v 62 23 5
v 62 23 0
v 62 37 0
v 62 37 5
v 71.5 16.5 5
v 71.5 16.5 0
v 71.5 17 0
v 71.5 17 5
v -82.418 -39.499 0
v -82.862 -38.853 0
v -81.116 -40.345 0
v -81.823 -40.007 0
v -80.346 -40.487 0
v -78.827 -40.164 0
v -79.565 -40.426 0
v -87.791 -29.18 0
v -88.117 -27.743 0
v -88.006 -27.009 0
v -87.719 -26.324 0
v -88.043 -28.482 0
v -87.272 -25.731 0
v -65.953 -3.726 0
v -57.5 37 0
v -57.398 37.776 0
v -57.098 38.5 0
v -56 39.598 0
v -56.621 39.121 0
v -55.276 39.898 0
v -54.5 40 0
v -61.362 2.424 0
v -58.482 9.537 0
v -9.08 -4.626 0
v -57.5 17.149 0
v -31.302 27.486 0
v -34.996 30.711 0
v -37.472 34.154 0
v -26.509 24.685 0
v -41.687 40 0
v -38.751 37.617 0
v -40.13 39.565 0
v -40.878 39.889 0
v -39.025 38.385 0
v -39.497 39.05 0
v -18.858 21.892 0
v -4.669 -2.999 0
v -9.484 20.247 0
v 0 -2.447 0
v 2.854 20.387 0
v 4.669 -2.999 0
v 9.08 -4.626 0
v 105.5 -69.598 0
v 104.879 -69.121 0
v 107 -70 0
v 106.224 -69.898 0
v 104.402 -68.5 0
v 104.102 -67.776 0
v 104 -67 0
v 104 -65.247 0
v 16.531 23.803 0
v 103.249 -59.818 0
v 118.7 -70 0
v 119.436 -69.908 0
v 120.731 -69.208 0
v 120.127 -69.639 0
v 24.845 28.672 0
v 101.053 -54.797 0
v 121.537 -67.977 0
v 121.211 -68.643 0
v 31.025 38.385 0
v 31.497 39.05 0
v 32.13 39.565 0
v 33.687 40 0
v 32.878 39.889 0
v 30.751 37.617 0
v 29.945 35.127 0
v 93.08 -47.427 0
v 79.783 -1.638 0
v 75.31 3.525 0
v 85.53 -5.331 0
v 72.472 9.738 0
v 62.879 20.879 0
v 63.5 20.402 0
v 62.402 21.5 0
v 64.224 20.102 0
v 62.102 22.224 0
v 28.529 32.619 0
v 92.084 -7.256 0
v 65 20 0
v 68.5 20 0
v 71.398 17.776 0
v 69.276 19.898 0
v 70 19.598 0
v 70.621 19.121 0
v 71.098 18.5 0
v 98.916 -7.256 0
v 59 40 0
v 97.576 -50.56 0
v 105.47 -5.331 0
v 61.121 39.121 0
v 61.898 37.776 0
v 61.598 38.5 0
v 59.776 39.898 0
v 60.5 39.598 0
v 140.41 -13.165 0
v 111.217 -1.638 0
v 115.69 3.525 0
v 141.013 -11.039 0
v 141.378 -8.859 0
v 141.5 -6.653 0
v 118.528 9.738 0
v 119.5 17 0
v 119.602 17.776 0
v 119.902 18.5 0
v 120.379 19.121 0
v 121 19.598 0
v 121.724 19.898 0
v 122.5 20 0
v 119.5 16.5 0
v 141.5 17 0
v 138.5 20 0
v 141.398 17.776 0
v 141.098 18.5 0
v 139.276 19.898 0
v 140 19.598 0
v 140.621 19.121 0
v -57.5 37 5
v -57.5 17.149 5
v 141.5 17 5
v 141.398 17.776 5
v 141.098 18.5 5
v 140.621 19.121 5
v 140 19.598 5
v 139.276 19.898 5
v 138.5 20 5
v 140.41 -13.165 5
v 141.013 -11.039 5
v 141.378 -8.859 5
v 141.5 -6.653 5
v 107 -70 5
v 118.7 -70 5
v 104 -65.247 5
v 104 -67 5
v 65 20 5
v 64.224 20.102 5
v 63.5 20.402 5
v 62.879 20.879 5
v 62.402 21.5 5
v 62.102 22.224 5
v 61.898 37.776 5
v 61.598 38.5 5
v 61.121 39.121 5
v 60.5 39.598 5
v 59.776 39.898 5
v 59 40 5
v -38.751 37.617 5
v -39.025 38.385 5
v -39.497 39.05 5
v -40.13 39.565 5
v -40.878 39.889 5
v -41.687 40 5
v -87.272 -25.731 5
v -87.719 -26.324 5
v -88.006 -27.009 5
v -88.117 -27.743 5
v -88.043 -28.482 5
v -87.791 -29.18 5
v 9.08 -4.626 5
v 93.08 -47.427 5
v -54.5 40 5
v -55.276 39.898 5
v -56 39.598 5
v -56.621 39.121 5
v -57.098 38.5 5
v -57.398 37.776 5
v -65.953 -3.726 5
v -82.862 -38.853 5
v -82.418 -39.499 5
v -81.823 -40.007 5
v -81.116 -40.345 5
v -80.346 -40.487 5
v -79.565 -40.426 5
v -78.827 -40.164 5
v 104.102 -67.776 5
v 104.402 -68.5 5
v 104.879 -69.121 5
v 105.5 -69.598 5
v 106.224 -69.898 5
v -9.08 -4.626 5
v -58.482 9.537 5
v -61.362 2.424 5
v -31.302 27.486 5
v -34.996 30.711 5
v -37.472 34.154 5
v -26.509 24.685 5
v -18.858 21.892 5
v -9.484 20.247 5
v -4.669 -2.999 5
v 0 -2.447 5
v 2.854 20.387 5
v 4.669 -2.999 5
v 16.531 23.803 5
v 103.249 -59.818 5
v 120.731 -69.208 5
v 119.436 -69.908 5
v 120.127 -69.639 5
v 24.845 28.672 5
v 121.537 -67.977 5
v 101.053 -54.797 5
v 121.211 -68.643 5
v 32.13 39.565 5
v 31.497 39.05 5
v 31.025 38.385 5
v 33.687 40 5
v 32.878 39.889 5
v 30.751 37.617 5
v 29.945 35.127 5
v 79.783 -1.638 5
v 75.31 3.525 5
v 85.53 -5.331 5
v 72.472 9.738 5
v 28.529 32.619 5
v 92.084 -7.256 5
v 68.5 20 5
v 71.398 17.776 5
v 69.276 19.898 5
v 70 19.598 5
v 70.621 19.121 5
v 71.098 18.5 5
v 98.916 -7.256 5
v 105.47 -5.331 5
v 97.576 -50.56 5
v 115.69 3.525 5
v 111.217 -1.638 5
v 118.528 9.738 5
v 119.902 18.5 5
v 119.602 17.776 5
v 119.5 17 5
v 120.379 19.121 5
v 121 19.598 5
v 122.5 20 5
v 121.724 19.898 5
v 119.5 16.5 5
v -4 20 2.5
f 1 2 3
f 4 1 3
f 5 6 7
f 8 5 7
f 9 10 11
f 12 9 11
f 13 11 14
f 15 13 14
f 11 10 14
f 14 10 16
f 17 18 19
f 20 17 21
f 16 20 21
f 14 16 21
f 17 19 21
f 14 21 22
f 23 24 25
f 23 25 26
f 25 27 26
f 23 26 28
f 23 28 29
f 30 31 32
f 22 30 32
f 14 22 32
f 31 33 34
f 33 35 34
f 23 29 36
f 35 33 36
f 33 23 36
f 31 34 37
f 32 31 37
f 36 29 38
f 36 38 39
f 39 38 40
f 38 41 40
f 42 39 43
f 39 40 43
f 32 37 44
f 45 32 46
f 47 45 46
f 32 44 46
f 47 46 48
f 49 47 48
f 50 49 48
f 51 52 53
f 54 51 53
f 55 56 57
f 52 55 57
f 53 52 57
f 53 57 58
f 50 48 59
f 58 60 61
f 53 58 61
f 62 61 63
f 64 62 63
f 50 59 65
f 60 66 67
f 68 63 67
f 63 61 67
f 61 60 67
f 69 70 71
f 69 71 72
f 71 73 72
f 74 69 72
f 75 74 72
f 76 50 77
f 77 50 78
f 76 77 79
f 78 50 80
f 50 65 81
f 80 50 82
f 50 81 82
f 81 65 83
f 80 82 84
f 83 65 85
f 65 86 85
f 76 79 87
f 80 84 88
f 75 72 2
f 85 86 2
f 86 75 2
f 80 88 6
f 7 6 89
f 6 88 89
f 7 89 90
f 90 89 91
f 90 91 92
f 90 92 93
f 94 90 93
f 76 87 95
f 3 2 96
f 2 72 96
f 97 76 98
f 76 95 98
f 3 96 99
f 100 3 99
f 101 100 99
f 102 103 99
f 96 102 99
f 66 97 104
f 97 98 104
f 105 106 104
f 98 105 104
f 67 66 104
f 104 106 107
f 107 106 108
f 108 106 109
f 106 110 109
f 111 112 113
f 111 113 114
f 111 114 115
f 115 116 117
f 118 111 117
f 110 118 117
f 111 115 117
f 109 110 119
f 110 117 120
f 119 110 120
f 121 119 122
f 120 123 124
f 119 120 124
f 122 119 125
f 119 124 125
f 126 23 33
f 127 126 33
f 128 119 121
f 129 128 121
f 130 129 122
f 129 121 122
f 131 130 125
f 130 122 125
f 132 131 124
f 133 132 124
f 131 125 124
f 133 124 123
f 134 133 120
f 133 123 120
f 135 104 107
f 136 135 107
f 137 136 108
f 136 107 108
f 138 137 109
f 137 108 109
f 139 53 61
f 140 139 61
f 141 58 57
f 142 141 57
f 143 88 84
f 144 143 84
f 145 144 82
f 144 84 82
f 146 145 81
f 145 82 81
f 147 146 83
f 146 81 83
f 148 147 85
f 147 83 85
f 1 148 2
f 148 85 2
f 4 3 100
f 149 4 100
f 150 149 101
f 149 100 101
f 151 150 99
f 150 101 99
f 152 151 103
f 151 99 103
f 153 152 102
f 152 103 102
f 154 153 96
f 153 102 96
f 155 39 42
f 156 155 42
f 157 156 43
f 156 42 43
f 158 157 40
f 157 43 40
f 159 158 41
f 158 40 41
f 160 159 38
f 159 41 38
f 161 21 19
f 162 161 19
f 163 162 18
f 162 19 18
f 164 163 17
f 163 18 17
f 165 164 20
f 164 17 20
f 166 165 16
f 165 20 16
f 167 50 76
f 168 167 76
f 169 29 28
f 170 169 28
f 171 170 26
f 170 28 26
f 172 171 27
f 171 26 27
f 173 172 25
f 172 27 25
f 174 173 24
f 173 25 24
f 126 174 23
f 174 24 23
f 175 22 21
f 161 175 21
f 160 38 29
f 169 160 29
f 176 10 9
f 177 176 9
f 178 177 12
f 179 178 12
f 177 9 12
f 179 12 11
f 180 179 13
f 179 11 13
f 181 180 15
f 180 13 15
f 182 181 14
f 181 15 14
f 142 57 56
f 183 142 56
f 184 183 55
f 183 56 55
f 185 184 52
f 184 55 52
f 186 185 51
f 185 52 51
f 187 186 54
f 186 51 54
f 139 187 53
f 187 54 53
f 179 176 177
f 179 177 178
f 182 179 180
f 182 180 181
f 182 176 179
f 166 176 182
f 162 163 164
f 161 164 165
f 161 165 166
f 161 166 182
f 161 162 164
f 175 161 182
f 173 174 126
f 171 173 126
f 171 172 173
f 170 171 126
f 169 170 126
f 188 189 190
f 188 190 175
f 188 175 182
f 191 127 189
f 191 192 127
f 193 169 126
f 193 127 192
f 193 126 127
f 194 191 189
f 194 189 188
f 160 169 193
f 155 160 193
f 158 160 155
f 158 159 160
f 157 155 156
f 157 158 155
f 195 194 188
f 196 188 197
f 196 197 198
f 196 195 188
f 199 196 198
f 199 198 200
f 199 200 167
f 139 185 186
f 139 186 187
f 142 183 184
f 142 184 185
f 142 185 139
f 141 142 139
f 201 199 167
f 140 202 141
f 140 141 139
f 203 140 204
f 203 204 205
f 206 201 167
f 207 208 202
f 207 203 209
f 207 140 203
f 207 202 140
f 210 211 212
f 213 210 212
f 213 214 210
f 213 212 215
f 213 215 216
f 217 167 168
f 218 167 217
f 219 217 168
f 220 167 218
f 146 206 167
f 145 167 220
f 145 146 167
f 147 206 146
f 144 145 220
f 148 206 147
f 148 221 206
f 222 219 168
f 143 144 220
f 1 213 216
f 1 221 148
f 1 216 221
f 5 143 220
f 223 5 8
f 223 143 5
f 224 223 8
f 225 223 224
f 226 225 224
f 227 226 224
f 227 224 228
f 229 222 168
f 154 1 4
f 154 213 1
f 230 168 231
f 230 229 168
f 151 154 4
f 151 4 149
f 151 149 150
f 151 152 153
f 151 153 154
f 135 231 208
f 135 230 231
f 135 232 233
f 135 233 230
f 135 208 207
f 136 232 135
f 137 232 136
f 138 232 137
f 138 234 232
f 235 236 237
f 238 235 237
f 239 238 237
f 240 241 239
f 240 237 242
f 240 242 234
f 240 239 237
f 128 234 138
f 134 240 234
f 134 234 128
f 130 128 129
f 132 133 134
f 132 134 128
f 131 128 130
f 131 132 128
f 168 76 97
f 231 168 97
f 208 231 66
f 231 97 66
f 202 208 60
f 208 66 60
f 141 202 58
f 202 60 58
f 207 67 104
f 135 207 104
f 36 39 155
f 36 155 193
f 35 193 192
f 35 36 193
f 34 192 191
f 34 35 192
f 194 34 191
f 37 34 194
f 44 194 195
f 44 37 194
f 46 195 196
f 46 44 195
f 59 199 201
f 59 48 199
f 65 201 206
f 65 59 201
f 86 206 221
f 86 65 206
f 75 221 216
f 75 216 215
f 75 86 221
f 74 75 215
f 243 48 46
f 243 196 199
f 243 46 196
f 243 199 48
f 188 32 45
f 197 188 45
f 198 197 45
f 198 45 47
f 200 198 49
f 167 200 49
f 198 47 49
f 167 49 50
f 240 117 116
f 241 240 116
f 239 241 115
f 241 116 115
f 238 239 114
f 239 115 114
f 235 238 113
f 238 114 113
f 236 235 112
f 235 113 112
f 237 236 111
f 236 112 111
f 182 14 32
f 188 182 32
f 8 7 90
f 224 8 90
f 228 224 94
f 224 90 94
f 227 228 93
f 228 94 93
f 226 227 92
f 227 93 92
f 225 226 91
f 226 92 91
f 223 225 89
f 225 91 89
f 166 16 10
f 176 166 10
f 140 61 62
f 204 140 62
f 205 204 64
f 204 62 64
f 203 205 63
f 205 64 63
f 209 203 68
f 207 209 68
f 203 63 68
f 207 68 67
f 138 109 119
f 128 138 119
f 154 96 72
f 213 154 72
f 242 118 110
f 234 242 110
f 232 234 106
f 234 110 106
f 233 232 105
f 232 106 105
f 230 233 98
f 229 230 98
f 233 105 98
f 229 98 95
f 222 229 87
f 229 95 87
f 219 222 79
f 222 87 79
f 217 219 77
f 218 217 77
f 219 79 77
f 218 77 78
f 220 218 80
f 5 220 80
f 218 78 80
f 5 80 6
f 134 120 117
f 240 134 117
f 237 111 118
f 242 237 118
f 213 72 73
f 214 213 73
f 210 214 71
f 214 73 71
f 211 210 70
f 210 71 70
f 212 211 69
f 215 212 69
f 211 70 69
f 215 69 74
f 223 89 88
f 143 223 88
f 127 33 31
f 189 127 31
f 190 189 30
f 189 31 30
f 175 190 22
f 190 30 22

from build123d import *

# Parameters (mm, degrees)
EXTRUDE1_DEPTH = 5


with BuildPart() as part:
    # Sketch1 → Extrude1 (new body)
    with BuildSketch(Plane.XY):
        with BuildLine():
            Line((9.079809995, -4.626394269), (93.079809995, -47.426532026))
            ThreePointArc((93.079809995, -47.426532026), (101.052803287, -54.796691216), (104, -65.24666251))
            Line((104, -65.24666251), (104, -67))
            ThreePointArc((104, -67), (104.878679656, -69.121320344), (107, -70))
            Line((107, -70), (118.700463999, -70))
            ThreePointArc((118.700463999, -70), (120.442572866, -69.442346555), (121.537019726, -67.976704463))
            Line((121.537019726, -67.976704463), (140.410371512, -13.164510908))
            ThreePointArc((140.410371512, -13.164510908), (141.225712031, -9.954099936), (141.5, -6.653147818))
            Line((141.5, -6.653147818), (141.5, 17))
            ThreePointArc((141.5, 17), (140.621320344, 19.121320344), (138.5, 20))
            Line((138.5, 20), (122.5, 20))
            ThreePointArc((122.5, 20), (120.378679656, 19.121320344), (119.5, 17))
            Line((119.5, 17), (119.5, 16.5))
            ThreePointArc((119.5, 16.5), (95.5, -7.5), (71.5, 16.5))
            Line((71.5, 16.5), (71.5, 17))
            ThreePointArc((71.5, 17), (70.621320344, 19.121320344), (68.5, 20))
            Line((68.5, 20), (65, 20))
            ThreePointArc((65, 20), (62.878679656, 20.878679656), (62, 23))
            Line((62, 23), (62, 37))
            ThreePointArc((62, 37), (61.121320344, 39.121320344), (59, 40))
            Line((59, 40), (33.68653561, 40))
            ThreePointArc((33.68653561, 40), (31.795766306, 39.329161102), (30.750598067, 37.616660959))
            add(Edge.make_bspline(
                [(-38.750598067, 37.616660959), (-35.050414777, 20), (-4, 20), (27.050414777, 20), (30.750598067, 37.616660959)],
                knots=[3.261043467, 3.261043467, 3.261043467, 4.71238898, 4.71238898, 6.163734494, 6.163734494, 6.163734494], degree=2, weights=[1, 0.748053124, 1, 0.748053124, 1]))
            ThreePointArc((-38.750598067, 37.616660959), (-39.795766306, 39.329161102), (-41.68653561, 40))
            Line((-41.68653561, 40), (-54.5, 40))
            ThreePointArc((-54.5, 40), (-56.621320344, 39.121320344), (-57.5, 37))
            Line((-57.5, 37), (-57.5, 17.148970879))
            ThreePointArc((-57.5, 17.148970879), (-59.693566818, 5.888319313), (-65.953484912, -3.725599478))
            Line((-65.953484912, -3.725599478), (-87.272335061, -25.73069556))
            ThreePointArc((-87.272335061, -25.73069556), (-88.084372164, -27.372329), (-87.790703125, -29.180124095))
            Line((-87.790703125, -29.180124095), (-82.861971499, -38.853304561))
            ThreePointArc((-82.861971499, -38.853304561), (-81.11600291, -40.344502611), (-78.826980427, -40.164352635))
            Line((-78.826980427, -40.164352635), (-9.079809995, -4.626394269))
            ThreePointArc((-9.079809995, -4.626394269), (0, -2.446524753), (9.079809995, -4.626394269))
        make_face()
    extrude(amount=EXTRUDE1_DEPTH)


solid = part.part
